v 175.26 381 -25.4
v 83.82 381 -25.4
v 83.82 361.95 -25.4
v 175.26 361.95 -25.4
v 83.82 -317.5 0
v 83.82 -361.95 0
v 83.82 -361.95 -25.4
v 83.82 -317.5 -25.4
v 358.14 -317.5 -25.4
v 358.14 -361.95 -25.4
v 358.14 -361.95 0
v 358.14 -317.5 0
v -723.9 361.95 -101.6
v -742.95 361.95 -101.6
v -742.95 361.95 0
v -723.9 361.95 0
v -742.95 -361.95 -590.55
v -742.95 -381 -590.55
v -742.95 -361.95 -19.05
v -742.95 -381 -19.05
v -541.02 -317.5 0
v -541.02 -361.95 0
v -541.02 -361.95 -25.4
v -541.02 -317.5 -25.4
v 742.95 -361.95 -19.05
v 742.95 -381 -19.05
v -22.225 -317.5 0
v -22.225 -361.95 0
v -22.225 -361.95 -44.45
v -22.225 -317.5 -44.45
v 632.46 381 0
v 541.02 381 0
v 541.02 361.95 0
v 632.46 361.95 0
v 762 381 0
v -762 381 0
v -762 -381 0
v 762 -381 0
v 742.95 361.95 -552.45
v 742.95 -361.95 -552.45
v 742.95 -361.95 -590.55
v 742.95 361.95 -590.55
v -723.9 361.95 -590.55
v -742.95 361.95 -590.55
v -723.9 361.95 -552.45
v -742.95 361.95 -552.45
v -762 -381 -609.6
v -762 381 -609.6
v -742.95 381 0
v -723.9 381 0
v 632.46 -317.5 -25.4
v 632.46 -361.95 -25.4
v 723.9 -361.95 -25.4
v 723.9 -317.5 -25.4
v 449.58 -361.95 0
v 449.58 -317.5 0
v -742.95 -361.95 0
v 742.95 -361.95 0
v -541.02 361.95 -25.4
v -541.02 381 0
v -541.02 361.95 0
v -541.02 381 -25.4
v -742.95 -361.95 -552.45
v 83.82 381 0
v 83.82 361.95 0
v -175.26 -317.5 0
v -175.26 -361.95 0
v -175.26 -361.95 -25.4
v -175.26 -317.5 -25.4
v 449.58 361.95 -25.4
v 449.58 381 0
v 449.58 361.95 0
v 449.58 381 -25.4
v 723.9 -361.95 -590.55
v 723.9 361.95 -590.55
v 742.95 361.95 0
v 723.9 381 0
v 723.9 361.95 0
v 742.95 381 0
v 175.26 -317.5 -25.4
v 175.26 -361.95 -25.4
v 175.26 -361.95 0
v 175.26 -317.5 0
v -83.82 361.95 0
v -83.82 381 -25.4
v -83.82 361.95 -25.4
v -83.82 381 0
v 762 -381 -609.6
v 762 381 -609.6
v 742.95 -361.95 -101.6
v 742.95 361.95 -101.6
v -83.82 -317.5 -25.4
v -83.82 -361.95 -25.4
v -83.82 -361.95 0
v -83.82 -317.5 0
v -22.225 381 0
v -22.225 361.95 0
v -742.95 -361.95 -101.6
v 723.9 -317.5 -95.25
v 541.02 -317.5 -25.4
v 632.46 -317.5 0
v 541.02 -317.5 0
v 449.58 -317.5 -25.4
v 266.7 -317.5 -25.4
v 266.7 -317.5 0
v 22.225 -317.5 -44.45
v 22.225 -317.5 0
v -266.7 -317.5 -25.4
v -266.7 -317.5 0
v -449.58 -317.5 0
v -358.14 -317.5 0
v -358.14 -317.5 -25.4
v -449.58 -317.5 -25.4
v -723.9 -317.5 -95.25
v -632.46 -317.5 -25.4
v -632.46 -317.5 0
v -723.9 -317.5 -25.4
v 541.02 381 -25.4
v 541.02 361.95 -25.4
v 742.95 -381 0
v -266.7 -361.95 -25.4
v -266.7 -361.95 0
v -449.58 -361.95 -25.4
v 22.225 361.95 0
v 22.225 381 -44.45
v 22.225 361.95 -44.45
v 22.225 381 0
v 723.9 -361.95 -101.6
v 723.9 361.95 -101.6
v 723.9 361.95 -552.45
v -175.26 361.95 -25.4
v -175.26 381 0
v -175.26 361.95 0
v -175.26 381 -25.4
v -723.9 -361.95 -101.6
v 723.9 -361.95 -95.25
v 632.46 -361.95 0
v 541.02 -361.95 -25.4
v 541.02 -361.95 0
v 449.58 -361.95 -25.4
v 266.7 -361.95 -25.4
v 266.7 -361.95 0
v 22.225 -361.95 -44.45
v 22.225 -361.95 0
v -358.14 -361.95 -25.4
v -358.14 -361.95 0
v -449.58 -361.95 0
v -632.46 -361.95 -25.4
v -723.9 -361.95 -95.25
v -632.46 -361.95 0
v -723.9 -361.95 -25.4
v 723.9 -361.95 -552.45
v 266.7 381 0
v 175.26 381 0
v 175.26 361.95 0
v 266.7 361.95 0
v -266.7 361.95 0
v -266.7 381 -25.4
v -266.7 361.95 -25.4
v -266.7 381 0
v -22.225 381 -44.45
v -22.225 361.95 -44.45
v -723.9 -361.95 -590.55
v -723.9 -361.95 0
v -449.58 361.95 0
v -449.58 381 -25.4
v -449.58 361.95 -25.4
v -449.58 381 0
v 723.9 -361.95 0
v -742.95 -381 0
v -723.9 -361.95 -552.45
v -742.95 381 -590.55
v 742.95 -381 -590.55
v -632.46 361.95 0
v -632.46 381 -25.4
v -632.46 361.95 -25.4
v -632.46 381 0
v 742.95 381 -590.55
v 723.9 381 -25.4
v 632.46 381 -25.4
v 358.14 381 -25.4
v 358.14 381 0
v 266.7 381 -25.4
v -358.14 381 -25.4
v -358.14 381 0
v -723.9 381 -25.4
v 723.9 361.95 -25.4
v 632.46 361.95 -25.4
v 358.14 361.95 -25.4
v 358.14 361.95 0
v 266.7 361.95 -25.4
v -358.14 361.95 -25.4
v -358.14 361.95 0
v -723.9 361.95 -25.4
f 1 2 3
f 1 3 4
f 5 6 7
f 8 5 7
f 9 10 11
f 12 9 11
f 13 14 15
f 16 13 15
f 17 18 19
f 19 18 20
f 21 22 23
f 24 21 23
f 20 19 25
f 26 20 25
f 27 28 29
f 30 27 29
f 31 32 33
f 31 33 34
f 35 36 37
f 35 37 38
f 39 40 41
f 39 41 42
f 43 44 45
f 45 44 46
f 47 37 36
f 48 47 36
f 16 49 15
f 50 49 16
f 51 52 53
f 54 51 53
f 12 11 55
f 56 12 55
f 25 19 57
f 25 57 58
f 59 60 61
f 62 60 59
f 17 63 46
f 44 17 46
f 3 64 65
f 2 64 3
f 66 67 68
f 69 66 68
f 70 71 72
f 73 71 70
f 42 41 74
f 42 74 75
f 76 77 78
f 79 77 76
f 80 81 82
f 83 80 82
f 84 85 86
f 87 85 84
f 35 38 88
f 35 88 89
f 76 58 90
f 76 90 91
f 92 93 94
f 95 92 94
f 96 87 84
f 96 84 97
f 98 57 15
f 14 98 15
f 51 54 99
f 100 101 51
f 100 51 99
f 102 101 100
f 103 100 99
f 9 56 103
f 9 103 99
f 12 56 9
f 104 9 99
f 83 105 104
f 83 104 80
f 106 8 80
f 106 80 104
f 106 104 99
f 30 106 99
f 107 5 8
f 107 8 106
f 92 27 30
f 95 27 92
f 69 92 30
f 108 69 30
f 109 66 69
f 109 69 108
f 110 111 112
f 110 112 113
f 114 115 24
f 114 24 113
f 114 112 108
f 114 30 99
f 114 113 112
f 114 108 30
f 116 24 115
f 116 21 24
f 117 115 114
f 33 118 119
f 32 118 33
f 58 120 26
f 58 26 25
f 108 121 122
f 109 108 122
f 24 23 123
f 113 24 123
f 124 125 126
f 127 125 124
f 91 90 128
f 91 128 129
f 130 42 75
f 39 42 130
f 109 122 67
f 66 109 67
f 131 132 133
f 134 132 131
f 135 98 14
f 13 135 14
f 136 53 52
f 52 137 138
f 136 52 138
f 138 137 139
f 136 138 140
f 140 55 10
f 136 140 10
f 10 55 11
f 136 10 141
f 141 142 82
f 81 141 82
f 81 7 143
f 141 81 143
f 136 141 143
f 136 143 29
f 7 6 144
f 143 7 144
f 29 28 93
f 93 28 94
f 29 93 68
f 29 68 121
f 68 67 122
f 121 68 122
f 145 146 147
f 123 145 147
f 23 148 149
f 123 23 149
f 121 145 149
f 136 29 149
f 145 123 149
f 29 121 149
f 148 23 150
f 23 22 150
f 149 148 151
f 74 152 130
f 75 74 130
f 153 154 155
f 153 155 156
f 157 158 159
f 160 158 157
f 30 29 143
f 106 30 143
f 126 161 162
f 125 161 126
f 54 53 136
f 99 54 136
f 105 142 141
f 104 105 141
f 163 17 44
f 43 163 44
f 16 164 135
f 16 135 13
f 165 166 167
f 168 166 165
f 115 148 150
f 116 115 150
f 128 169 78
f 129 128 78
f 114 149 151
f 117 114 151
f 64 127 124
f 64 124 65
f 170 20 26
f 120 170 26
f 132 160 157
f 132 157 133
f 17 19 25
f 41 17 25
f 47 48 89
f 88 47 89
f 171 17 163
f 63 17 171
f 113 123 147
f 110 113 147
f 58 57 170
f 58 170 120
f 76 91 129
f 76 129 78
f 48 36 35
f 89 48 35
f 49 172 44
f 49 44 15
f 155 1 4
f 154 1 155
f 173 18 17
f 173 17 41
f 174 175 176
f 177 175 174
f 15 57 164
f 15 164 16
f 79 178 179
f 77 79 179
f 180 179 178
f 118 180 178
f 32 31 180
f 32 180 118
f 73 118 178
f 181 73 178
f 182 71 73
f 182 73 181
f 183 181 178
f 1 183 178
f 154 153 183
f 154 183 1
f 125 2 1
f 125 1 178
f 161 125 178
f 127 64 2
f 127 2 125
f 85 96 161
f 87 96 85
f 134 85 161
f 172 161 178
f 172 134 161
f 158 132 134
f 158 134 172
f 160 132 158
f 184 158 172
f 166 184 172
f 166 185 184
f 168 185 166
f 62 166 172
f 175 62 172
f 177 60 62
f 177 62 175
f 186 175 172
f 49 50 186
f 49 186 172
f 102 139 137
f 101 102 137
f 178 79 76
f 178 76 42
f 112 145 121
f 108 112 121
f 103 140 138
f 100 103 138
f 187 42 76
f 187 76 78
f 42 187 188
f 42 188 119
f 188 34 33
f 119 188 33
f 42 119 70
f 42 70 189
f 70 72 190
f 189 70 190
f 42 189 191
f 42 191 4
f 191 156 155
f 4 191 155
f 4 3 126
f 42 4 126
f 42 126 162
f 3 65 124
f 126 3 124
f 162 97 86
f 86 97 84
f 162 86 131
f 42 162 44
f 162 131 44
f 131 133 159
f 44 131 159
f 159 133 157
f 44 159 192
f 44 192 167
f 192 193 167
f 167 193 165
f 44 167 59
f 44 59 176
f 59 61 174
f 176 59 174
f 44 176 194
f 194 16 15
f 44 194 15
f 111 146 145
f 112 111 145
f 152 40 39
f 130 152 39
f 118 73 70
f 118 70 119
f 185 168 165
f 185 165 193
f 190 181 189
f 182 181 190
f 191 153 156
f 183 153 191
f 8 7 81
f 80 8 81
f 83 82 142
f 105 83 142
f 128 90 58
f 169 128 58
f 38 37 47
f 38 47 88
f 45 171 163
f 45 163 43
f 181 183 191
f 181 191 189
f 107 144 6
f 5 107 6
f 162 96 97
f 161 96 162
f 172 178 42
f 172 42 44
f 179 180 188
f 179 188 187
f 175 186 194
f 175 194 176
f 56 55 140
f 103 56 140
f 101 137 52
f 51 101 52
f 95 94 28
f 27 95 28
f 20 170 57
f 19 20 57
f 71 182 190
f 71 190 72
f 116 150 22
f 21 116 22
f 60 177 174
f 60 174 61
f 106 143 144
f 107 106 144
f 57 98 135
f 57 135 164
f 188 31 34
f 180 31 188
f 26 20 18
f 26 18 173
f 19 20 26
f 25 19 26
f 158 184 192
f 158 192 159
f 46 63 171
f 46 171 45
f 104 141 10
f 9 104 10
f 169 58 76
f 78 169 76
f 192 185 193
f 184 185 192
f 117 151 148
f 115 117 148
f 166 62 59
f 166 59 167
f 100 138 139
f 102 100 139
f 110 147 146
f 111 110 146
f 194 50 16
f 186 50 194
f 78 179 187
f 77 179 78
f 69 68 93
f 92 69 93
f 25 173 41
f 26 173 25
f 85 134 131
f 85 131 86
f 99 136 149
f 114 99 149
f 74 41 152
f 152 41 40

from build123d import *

# Parameters (mm, degrees)
F0_W      = 1524
F0_H      = 762
F1_DEPTH  = 609.6
F2_W      = 1485.9
F2_H      = 571.5
F3_DEPTH  = 19.05
F5_DEPTH  = 44.45
F7_DEPTH  = 19.05
F8_W      = 723.9
F8_H      = 101.6
F8_H_2    = 38.1
F9_DEPTH  = 19.05
F11_W     = 1485.9
F11_H     = 19.05
F12_DEPTH = 19.05


with BuildPart() as f1:
    # F0 (on Top) → F1 (new body)
    with BuildSketch(Plane.XY):
        Rectangle(F0_W, F0_H)
    extrude(amount=-F1_DEPTH)


with BuildPart() as f3:
    # F2 (on face) → F3 (new body)
    with BuildSketch(Plane.XZ.offset(381)):
        with Locations((0, -304.8)):
            Rectangle(F2_W, F2_H)
    extrude(amount=-F3_DEPTH)


with BuildPart() as f5:
    # F4 (on face) → F5 (new body)
    with BuildSketch(Plane(origin=(0, -361.95, 0), x_dir=(-1, 0, 0), z_dir=(0, 1, 0))):
        Polygon((-723.9, -25.4), (-723.9, -95.25), (723.9, -95.25), (723.9, -25.4), (632.46, -25.4), (632.46, 0), (541.02, 0), (541.02, -25.4), (449.58, -25.4), (449.58, 0), (358.14, 0), (358.14, -25.4), (266.7, -25.4), (266.7, 0), (175.26, 0), (175.26, -25.4), (83.82, -25.4), (83.82, 0), (22.225, 0), (22.225, -44.45), (-22.225, -44.45), (-22.225, 0), (-83.82, 0), (-83.82, -25.4), (-175.26, -25.4), (-175.26, 0), (-266.7, 0), (-266.7, -25.4), (-358.14, -25.4), (-358.14, 0), (-449.58, 0), (-449.58, -25.4), (-541.02, -25.4), (-541.02, 0), (-632.46, 0), (-632.46, -25.4), align=None)
    extrude(amount=F5_DEPTH)


with BuildPart() as f7:
    # F6 (on face) → F7 (new body)
    with BuildSketch(Plane(origin=(0, 381, 0), x_dir=(-1, 0, 0), z_dir=(0, 1, 0))):
        Polygon((-742.95, 0), (-742.95, -590.55), (742.95, -590.55), (742.95, 0), (723.9, 0), (723.9, -25.4), (632.46, -25.4), (632.46, 0), (541.02, 0), (541.02, -25.4), (449.58, -25.4), (449.58, 0), (358.14, 0), (358.14, -25.4), (266.7, -25.4), (266.7, 0), (175.26, 0), (175.26, -25.4), (83.82, -25.4), (83.82, 0), (22.225, 0), (22.225, -44.45), (-22.225, -44.45), (-22.225, 0), (-83.82, 0), (-83.82, -25.4), (-175.26, -25.4), (-175.26, 0), (-266.7, 0), (-266.7, -25.4), (-358.14, -25.4), (-358.14, 0), (-449.58, 0), (-449.58, -25.4), (-541.02, -25.4), (-541.02, 0), (-632.46, 0), (-632.46, -25.4), (-723.9, -25.4), (-723.9, 0), align=None)
    extrude(amount=-F7_DEPTH)


with BuildPart() as f9:
    # F8 (on face) → F9 (new body)
    with BuildSketch(Plane.YZ.offset(742.95)):
        with Locations((0, -50.8)):
            Rectangle(F8_W, F8_H)
        with Locations((0, -571.5)):
            Rectangle(F8_W, F8_H_2)
    extrude(amount=-F9_DEPTH)


with BuildPart() as f10_1:
    # F10: instance of F9
    add(f9.part.mirror(Plane.YZ))


with BuildPart() as f12:
    # F11 (on face) → F12 (new body)
    with BuildSketch(Plane.XY.offset(-19.05)):
        with Locations((0, -371.475)):
            Rectangle(F11_W, F11_H)
    extrude(amount=F12_DEPTH)


solid = Compound([f1.part, f3.part, f5.part, f7.part, f9.part, f10_1.part, f12.part])
